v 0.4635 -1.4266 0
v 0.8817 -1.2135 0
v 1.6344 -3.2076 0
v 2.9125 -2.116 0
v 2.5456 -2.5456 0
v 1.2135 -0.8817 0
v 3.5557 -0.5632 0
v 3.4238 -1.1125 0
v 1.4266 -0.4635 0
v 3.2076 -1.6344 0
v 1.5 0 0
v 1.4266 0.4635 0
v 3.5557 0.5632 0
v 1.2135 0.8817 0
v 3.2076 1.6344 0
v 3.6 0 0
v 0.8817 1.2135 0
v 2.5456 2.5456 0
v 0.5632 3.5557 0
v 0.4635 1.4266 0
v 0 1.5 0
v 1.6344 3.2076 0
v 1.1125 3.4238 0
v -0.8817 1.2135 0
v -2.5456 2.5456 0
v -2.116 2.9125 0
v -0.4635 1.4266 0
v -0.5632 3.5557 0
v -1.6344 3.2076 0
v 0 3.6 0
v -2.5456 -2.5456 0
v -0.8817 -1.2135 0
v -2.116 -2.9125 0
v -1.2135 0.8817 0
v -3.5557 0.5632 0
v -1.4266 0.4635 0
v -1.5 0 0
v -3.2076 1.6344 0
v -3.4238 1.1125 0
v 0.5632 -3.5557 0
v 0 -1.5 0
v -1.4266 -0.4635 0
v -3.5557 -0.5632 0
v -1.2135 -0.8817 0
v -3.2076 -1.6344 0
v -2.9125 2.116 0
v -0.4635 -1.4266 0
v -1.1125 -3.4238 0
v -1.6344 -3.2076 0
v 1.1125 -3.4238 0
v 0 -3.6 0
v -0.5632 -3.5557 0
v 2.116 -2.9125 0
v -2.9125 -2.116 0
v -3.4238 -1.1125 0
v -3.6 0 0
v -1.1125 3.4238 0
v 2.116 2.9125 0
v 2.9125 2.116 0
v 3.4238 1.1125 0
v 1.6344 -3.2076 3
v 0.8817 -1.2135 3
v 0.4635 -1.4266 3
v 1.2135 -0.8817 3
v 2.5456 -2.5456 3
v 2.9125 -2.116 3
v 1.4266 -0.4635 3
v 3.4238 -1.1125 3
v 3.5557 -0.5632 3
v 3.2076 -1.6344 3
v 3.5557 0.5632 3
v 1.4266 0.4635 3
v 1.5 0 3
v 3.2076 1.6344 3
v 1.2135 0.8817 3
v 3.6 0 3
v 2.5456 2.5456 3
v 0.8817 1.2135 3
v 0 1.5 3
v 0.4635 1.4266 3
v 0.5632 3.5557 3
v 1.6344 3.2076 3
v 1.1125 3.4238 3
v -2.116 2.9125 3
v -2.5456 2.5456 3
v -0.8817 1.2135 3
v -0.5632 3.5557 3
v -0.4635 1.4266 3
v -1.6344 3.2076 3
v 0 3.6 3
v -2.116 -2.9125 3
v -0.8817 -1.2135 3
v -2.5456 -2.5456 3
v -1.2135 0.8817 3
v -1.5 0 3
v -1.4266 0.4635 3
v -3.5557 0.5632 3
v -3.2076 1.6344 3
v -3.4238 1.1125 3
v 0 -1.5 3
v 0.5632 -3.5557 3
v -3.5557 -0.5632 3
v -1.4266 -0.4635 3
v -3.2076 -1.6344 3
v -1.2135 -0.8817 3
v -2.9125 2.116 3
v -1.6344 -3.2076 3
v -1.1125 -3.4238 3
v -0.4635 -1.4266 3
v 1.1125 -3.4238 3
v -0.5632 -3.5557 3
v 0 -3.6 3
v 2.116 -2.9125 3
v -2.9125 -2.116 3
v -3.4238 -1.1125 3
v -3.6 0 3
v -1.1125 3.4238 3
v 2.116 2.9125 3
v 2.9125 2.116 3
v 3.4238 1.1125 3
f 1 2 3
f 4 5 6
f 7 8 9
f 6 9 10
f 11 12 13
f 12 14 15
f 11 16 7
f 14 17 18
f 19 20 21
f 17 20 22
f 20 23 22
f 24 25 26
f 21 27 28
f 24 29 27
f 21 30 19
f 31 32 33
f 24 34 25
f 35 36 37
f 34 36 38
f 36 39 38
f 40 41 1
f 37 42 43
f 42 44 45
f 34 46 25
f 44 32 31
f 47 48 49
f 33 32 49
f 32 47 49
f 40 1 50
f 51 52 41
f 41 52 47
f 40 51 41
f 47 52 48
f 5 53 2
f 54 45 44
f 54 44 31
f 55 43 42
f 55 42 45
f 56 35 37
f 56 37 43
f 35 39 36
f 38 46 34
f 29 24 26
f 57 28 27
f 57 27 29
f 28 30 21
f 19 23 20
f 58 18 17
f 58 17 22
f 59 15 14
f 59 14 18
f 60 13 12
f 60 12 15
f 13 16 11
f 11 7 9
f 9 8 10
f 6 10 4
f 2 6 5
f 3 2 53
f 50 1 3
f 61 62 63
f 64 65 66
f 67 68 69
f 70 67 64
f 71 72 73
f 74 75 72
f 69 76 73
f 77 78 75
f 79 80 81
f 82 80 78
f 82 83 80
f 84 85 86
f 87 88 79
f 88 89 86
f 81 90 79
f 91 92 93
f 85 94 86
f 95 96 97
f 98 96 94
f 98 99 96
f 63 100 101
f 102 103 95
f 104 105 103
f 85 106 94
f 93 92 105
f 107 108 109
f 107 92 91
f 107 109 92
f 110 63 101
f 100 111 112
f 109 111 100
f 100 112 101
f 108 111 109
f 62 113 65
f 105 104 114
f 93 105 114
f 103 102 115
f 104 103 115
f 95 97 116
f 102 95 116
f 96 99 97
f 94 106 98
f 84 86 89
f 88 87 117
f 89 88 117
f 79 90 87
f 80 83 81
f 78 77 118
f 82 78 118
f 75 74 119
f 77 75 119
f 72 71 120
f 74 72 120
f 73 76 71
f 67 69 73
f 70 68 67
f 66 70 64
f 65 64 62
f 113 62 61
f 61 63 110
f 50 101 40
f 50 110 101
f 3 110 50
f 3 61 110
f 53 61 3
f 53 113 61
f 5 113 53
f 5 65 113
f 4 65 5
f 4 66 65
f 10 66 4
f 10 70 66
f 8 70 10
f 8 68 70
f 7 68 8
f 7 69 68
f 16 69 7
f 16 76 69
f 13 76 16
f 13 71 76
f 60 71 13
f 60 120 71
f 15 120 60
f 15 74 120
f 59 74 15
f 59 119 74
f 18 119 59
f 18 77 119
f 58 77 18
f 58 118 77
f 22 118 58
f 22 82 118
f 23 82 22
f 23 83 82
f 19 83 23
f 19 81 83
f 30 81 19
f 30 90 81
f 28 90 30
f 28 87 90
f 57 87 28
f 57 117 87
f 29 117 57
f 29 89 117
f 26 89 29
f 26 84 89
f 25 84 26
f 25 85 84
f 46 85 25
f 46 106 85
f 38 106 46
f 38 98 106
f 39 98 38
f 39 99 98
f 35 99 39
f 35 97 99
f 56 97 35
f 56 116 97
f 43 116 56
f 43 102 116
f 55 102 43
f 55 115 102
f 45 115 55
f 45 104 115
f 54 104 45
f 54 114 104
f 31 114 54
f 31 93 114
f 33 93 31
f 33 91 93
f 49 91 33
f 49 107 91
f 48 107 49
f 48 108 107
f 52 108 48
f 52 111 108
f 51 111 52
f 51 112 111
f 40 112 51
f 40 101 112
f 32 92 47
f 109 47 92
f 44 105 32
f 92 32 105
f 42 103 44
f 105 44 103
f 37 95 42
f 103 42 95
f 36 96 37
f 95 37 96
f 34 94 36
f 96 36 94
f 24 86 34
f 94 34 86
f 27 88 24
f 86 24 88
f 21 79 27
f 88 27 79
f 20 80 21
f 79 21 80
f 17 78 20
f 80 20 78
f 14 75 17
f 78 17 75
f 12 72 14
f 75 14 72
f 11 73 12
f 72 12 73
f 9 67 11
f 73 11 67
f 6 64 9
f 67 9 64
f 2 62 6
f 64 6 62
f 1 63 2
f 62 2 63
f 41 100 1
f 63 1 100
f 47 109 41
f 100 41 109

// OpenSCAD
difference() {
  union() {
    translate([-5,-5]) intersection(){
      union() {cube([10,20,30]);
      rotate([0,-15,0]) cube([10,20,40]);
      }
      translate([-20,0]) cube([30,16,26]);
    }
    translate([0,0,26]) cylinder(d=7,h=6,$fn=40);
  }
  translate([0,0,6]) cylinder(d=3,h=27,$fn=20);
}

!linear_extrude(3) {
  difference() {
    circle(d=7.2,$fn=40);
    circle(d=3,$fn=20);
  }
}
